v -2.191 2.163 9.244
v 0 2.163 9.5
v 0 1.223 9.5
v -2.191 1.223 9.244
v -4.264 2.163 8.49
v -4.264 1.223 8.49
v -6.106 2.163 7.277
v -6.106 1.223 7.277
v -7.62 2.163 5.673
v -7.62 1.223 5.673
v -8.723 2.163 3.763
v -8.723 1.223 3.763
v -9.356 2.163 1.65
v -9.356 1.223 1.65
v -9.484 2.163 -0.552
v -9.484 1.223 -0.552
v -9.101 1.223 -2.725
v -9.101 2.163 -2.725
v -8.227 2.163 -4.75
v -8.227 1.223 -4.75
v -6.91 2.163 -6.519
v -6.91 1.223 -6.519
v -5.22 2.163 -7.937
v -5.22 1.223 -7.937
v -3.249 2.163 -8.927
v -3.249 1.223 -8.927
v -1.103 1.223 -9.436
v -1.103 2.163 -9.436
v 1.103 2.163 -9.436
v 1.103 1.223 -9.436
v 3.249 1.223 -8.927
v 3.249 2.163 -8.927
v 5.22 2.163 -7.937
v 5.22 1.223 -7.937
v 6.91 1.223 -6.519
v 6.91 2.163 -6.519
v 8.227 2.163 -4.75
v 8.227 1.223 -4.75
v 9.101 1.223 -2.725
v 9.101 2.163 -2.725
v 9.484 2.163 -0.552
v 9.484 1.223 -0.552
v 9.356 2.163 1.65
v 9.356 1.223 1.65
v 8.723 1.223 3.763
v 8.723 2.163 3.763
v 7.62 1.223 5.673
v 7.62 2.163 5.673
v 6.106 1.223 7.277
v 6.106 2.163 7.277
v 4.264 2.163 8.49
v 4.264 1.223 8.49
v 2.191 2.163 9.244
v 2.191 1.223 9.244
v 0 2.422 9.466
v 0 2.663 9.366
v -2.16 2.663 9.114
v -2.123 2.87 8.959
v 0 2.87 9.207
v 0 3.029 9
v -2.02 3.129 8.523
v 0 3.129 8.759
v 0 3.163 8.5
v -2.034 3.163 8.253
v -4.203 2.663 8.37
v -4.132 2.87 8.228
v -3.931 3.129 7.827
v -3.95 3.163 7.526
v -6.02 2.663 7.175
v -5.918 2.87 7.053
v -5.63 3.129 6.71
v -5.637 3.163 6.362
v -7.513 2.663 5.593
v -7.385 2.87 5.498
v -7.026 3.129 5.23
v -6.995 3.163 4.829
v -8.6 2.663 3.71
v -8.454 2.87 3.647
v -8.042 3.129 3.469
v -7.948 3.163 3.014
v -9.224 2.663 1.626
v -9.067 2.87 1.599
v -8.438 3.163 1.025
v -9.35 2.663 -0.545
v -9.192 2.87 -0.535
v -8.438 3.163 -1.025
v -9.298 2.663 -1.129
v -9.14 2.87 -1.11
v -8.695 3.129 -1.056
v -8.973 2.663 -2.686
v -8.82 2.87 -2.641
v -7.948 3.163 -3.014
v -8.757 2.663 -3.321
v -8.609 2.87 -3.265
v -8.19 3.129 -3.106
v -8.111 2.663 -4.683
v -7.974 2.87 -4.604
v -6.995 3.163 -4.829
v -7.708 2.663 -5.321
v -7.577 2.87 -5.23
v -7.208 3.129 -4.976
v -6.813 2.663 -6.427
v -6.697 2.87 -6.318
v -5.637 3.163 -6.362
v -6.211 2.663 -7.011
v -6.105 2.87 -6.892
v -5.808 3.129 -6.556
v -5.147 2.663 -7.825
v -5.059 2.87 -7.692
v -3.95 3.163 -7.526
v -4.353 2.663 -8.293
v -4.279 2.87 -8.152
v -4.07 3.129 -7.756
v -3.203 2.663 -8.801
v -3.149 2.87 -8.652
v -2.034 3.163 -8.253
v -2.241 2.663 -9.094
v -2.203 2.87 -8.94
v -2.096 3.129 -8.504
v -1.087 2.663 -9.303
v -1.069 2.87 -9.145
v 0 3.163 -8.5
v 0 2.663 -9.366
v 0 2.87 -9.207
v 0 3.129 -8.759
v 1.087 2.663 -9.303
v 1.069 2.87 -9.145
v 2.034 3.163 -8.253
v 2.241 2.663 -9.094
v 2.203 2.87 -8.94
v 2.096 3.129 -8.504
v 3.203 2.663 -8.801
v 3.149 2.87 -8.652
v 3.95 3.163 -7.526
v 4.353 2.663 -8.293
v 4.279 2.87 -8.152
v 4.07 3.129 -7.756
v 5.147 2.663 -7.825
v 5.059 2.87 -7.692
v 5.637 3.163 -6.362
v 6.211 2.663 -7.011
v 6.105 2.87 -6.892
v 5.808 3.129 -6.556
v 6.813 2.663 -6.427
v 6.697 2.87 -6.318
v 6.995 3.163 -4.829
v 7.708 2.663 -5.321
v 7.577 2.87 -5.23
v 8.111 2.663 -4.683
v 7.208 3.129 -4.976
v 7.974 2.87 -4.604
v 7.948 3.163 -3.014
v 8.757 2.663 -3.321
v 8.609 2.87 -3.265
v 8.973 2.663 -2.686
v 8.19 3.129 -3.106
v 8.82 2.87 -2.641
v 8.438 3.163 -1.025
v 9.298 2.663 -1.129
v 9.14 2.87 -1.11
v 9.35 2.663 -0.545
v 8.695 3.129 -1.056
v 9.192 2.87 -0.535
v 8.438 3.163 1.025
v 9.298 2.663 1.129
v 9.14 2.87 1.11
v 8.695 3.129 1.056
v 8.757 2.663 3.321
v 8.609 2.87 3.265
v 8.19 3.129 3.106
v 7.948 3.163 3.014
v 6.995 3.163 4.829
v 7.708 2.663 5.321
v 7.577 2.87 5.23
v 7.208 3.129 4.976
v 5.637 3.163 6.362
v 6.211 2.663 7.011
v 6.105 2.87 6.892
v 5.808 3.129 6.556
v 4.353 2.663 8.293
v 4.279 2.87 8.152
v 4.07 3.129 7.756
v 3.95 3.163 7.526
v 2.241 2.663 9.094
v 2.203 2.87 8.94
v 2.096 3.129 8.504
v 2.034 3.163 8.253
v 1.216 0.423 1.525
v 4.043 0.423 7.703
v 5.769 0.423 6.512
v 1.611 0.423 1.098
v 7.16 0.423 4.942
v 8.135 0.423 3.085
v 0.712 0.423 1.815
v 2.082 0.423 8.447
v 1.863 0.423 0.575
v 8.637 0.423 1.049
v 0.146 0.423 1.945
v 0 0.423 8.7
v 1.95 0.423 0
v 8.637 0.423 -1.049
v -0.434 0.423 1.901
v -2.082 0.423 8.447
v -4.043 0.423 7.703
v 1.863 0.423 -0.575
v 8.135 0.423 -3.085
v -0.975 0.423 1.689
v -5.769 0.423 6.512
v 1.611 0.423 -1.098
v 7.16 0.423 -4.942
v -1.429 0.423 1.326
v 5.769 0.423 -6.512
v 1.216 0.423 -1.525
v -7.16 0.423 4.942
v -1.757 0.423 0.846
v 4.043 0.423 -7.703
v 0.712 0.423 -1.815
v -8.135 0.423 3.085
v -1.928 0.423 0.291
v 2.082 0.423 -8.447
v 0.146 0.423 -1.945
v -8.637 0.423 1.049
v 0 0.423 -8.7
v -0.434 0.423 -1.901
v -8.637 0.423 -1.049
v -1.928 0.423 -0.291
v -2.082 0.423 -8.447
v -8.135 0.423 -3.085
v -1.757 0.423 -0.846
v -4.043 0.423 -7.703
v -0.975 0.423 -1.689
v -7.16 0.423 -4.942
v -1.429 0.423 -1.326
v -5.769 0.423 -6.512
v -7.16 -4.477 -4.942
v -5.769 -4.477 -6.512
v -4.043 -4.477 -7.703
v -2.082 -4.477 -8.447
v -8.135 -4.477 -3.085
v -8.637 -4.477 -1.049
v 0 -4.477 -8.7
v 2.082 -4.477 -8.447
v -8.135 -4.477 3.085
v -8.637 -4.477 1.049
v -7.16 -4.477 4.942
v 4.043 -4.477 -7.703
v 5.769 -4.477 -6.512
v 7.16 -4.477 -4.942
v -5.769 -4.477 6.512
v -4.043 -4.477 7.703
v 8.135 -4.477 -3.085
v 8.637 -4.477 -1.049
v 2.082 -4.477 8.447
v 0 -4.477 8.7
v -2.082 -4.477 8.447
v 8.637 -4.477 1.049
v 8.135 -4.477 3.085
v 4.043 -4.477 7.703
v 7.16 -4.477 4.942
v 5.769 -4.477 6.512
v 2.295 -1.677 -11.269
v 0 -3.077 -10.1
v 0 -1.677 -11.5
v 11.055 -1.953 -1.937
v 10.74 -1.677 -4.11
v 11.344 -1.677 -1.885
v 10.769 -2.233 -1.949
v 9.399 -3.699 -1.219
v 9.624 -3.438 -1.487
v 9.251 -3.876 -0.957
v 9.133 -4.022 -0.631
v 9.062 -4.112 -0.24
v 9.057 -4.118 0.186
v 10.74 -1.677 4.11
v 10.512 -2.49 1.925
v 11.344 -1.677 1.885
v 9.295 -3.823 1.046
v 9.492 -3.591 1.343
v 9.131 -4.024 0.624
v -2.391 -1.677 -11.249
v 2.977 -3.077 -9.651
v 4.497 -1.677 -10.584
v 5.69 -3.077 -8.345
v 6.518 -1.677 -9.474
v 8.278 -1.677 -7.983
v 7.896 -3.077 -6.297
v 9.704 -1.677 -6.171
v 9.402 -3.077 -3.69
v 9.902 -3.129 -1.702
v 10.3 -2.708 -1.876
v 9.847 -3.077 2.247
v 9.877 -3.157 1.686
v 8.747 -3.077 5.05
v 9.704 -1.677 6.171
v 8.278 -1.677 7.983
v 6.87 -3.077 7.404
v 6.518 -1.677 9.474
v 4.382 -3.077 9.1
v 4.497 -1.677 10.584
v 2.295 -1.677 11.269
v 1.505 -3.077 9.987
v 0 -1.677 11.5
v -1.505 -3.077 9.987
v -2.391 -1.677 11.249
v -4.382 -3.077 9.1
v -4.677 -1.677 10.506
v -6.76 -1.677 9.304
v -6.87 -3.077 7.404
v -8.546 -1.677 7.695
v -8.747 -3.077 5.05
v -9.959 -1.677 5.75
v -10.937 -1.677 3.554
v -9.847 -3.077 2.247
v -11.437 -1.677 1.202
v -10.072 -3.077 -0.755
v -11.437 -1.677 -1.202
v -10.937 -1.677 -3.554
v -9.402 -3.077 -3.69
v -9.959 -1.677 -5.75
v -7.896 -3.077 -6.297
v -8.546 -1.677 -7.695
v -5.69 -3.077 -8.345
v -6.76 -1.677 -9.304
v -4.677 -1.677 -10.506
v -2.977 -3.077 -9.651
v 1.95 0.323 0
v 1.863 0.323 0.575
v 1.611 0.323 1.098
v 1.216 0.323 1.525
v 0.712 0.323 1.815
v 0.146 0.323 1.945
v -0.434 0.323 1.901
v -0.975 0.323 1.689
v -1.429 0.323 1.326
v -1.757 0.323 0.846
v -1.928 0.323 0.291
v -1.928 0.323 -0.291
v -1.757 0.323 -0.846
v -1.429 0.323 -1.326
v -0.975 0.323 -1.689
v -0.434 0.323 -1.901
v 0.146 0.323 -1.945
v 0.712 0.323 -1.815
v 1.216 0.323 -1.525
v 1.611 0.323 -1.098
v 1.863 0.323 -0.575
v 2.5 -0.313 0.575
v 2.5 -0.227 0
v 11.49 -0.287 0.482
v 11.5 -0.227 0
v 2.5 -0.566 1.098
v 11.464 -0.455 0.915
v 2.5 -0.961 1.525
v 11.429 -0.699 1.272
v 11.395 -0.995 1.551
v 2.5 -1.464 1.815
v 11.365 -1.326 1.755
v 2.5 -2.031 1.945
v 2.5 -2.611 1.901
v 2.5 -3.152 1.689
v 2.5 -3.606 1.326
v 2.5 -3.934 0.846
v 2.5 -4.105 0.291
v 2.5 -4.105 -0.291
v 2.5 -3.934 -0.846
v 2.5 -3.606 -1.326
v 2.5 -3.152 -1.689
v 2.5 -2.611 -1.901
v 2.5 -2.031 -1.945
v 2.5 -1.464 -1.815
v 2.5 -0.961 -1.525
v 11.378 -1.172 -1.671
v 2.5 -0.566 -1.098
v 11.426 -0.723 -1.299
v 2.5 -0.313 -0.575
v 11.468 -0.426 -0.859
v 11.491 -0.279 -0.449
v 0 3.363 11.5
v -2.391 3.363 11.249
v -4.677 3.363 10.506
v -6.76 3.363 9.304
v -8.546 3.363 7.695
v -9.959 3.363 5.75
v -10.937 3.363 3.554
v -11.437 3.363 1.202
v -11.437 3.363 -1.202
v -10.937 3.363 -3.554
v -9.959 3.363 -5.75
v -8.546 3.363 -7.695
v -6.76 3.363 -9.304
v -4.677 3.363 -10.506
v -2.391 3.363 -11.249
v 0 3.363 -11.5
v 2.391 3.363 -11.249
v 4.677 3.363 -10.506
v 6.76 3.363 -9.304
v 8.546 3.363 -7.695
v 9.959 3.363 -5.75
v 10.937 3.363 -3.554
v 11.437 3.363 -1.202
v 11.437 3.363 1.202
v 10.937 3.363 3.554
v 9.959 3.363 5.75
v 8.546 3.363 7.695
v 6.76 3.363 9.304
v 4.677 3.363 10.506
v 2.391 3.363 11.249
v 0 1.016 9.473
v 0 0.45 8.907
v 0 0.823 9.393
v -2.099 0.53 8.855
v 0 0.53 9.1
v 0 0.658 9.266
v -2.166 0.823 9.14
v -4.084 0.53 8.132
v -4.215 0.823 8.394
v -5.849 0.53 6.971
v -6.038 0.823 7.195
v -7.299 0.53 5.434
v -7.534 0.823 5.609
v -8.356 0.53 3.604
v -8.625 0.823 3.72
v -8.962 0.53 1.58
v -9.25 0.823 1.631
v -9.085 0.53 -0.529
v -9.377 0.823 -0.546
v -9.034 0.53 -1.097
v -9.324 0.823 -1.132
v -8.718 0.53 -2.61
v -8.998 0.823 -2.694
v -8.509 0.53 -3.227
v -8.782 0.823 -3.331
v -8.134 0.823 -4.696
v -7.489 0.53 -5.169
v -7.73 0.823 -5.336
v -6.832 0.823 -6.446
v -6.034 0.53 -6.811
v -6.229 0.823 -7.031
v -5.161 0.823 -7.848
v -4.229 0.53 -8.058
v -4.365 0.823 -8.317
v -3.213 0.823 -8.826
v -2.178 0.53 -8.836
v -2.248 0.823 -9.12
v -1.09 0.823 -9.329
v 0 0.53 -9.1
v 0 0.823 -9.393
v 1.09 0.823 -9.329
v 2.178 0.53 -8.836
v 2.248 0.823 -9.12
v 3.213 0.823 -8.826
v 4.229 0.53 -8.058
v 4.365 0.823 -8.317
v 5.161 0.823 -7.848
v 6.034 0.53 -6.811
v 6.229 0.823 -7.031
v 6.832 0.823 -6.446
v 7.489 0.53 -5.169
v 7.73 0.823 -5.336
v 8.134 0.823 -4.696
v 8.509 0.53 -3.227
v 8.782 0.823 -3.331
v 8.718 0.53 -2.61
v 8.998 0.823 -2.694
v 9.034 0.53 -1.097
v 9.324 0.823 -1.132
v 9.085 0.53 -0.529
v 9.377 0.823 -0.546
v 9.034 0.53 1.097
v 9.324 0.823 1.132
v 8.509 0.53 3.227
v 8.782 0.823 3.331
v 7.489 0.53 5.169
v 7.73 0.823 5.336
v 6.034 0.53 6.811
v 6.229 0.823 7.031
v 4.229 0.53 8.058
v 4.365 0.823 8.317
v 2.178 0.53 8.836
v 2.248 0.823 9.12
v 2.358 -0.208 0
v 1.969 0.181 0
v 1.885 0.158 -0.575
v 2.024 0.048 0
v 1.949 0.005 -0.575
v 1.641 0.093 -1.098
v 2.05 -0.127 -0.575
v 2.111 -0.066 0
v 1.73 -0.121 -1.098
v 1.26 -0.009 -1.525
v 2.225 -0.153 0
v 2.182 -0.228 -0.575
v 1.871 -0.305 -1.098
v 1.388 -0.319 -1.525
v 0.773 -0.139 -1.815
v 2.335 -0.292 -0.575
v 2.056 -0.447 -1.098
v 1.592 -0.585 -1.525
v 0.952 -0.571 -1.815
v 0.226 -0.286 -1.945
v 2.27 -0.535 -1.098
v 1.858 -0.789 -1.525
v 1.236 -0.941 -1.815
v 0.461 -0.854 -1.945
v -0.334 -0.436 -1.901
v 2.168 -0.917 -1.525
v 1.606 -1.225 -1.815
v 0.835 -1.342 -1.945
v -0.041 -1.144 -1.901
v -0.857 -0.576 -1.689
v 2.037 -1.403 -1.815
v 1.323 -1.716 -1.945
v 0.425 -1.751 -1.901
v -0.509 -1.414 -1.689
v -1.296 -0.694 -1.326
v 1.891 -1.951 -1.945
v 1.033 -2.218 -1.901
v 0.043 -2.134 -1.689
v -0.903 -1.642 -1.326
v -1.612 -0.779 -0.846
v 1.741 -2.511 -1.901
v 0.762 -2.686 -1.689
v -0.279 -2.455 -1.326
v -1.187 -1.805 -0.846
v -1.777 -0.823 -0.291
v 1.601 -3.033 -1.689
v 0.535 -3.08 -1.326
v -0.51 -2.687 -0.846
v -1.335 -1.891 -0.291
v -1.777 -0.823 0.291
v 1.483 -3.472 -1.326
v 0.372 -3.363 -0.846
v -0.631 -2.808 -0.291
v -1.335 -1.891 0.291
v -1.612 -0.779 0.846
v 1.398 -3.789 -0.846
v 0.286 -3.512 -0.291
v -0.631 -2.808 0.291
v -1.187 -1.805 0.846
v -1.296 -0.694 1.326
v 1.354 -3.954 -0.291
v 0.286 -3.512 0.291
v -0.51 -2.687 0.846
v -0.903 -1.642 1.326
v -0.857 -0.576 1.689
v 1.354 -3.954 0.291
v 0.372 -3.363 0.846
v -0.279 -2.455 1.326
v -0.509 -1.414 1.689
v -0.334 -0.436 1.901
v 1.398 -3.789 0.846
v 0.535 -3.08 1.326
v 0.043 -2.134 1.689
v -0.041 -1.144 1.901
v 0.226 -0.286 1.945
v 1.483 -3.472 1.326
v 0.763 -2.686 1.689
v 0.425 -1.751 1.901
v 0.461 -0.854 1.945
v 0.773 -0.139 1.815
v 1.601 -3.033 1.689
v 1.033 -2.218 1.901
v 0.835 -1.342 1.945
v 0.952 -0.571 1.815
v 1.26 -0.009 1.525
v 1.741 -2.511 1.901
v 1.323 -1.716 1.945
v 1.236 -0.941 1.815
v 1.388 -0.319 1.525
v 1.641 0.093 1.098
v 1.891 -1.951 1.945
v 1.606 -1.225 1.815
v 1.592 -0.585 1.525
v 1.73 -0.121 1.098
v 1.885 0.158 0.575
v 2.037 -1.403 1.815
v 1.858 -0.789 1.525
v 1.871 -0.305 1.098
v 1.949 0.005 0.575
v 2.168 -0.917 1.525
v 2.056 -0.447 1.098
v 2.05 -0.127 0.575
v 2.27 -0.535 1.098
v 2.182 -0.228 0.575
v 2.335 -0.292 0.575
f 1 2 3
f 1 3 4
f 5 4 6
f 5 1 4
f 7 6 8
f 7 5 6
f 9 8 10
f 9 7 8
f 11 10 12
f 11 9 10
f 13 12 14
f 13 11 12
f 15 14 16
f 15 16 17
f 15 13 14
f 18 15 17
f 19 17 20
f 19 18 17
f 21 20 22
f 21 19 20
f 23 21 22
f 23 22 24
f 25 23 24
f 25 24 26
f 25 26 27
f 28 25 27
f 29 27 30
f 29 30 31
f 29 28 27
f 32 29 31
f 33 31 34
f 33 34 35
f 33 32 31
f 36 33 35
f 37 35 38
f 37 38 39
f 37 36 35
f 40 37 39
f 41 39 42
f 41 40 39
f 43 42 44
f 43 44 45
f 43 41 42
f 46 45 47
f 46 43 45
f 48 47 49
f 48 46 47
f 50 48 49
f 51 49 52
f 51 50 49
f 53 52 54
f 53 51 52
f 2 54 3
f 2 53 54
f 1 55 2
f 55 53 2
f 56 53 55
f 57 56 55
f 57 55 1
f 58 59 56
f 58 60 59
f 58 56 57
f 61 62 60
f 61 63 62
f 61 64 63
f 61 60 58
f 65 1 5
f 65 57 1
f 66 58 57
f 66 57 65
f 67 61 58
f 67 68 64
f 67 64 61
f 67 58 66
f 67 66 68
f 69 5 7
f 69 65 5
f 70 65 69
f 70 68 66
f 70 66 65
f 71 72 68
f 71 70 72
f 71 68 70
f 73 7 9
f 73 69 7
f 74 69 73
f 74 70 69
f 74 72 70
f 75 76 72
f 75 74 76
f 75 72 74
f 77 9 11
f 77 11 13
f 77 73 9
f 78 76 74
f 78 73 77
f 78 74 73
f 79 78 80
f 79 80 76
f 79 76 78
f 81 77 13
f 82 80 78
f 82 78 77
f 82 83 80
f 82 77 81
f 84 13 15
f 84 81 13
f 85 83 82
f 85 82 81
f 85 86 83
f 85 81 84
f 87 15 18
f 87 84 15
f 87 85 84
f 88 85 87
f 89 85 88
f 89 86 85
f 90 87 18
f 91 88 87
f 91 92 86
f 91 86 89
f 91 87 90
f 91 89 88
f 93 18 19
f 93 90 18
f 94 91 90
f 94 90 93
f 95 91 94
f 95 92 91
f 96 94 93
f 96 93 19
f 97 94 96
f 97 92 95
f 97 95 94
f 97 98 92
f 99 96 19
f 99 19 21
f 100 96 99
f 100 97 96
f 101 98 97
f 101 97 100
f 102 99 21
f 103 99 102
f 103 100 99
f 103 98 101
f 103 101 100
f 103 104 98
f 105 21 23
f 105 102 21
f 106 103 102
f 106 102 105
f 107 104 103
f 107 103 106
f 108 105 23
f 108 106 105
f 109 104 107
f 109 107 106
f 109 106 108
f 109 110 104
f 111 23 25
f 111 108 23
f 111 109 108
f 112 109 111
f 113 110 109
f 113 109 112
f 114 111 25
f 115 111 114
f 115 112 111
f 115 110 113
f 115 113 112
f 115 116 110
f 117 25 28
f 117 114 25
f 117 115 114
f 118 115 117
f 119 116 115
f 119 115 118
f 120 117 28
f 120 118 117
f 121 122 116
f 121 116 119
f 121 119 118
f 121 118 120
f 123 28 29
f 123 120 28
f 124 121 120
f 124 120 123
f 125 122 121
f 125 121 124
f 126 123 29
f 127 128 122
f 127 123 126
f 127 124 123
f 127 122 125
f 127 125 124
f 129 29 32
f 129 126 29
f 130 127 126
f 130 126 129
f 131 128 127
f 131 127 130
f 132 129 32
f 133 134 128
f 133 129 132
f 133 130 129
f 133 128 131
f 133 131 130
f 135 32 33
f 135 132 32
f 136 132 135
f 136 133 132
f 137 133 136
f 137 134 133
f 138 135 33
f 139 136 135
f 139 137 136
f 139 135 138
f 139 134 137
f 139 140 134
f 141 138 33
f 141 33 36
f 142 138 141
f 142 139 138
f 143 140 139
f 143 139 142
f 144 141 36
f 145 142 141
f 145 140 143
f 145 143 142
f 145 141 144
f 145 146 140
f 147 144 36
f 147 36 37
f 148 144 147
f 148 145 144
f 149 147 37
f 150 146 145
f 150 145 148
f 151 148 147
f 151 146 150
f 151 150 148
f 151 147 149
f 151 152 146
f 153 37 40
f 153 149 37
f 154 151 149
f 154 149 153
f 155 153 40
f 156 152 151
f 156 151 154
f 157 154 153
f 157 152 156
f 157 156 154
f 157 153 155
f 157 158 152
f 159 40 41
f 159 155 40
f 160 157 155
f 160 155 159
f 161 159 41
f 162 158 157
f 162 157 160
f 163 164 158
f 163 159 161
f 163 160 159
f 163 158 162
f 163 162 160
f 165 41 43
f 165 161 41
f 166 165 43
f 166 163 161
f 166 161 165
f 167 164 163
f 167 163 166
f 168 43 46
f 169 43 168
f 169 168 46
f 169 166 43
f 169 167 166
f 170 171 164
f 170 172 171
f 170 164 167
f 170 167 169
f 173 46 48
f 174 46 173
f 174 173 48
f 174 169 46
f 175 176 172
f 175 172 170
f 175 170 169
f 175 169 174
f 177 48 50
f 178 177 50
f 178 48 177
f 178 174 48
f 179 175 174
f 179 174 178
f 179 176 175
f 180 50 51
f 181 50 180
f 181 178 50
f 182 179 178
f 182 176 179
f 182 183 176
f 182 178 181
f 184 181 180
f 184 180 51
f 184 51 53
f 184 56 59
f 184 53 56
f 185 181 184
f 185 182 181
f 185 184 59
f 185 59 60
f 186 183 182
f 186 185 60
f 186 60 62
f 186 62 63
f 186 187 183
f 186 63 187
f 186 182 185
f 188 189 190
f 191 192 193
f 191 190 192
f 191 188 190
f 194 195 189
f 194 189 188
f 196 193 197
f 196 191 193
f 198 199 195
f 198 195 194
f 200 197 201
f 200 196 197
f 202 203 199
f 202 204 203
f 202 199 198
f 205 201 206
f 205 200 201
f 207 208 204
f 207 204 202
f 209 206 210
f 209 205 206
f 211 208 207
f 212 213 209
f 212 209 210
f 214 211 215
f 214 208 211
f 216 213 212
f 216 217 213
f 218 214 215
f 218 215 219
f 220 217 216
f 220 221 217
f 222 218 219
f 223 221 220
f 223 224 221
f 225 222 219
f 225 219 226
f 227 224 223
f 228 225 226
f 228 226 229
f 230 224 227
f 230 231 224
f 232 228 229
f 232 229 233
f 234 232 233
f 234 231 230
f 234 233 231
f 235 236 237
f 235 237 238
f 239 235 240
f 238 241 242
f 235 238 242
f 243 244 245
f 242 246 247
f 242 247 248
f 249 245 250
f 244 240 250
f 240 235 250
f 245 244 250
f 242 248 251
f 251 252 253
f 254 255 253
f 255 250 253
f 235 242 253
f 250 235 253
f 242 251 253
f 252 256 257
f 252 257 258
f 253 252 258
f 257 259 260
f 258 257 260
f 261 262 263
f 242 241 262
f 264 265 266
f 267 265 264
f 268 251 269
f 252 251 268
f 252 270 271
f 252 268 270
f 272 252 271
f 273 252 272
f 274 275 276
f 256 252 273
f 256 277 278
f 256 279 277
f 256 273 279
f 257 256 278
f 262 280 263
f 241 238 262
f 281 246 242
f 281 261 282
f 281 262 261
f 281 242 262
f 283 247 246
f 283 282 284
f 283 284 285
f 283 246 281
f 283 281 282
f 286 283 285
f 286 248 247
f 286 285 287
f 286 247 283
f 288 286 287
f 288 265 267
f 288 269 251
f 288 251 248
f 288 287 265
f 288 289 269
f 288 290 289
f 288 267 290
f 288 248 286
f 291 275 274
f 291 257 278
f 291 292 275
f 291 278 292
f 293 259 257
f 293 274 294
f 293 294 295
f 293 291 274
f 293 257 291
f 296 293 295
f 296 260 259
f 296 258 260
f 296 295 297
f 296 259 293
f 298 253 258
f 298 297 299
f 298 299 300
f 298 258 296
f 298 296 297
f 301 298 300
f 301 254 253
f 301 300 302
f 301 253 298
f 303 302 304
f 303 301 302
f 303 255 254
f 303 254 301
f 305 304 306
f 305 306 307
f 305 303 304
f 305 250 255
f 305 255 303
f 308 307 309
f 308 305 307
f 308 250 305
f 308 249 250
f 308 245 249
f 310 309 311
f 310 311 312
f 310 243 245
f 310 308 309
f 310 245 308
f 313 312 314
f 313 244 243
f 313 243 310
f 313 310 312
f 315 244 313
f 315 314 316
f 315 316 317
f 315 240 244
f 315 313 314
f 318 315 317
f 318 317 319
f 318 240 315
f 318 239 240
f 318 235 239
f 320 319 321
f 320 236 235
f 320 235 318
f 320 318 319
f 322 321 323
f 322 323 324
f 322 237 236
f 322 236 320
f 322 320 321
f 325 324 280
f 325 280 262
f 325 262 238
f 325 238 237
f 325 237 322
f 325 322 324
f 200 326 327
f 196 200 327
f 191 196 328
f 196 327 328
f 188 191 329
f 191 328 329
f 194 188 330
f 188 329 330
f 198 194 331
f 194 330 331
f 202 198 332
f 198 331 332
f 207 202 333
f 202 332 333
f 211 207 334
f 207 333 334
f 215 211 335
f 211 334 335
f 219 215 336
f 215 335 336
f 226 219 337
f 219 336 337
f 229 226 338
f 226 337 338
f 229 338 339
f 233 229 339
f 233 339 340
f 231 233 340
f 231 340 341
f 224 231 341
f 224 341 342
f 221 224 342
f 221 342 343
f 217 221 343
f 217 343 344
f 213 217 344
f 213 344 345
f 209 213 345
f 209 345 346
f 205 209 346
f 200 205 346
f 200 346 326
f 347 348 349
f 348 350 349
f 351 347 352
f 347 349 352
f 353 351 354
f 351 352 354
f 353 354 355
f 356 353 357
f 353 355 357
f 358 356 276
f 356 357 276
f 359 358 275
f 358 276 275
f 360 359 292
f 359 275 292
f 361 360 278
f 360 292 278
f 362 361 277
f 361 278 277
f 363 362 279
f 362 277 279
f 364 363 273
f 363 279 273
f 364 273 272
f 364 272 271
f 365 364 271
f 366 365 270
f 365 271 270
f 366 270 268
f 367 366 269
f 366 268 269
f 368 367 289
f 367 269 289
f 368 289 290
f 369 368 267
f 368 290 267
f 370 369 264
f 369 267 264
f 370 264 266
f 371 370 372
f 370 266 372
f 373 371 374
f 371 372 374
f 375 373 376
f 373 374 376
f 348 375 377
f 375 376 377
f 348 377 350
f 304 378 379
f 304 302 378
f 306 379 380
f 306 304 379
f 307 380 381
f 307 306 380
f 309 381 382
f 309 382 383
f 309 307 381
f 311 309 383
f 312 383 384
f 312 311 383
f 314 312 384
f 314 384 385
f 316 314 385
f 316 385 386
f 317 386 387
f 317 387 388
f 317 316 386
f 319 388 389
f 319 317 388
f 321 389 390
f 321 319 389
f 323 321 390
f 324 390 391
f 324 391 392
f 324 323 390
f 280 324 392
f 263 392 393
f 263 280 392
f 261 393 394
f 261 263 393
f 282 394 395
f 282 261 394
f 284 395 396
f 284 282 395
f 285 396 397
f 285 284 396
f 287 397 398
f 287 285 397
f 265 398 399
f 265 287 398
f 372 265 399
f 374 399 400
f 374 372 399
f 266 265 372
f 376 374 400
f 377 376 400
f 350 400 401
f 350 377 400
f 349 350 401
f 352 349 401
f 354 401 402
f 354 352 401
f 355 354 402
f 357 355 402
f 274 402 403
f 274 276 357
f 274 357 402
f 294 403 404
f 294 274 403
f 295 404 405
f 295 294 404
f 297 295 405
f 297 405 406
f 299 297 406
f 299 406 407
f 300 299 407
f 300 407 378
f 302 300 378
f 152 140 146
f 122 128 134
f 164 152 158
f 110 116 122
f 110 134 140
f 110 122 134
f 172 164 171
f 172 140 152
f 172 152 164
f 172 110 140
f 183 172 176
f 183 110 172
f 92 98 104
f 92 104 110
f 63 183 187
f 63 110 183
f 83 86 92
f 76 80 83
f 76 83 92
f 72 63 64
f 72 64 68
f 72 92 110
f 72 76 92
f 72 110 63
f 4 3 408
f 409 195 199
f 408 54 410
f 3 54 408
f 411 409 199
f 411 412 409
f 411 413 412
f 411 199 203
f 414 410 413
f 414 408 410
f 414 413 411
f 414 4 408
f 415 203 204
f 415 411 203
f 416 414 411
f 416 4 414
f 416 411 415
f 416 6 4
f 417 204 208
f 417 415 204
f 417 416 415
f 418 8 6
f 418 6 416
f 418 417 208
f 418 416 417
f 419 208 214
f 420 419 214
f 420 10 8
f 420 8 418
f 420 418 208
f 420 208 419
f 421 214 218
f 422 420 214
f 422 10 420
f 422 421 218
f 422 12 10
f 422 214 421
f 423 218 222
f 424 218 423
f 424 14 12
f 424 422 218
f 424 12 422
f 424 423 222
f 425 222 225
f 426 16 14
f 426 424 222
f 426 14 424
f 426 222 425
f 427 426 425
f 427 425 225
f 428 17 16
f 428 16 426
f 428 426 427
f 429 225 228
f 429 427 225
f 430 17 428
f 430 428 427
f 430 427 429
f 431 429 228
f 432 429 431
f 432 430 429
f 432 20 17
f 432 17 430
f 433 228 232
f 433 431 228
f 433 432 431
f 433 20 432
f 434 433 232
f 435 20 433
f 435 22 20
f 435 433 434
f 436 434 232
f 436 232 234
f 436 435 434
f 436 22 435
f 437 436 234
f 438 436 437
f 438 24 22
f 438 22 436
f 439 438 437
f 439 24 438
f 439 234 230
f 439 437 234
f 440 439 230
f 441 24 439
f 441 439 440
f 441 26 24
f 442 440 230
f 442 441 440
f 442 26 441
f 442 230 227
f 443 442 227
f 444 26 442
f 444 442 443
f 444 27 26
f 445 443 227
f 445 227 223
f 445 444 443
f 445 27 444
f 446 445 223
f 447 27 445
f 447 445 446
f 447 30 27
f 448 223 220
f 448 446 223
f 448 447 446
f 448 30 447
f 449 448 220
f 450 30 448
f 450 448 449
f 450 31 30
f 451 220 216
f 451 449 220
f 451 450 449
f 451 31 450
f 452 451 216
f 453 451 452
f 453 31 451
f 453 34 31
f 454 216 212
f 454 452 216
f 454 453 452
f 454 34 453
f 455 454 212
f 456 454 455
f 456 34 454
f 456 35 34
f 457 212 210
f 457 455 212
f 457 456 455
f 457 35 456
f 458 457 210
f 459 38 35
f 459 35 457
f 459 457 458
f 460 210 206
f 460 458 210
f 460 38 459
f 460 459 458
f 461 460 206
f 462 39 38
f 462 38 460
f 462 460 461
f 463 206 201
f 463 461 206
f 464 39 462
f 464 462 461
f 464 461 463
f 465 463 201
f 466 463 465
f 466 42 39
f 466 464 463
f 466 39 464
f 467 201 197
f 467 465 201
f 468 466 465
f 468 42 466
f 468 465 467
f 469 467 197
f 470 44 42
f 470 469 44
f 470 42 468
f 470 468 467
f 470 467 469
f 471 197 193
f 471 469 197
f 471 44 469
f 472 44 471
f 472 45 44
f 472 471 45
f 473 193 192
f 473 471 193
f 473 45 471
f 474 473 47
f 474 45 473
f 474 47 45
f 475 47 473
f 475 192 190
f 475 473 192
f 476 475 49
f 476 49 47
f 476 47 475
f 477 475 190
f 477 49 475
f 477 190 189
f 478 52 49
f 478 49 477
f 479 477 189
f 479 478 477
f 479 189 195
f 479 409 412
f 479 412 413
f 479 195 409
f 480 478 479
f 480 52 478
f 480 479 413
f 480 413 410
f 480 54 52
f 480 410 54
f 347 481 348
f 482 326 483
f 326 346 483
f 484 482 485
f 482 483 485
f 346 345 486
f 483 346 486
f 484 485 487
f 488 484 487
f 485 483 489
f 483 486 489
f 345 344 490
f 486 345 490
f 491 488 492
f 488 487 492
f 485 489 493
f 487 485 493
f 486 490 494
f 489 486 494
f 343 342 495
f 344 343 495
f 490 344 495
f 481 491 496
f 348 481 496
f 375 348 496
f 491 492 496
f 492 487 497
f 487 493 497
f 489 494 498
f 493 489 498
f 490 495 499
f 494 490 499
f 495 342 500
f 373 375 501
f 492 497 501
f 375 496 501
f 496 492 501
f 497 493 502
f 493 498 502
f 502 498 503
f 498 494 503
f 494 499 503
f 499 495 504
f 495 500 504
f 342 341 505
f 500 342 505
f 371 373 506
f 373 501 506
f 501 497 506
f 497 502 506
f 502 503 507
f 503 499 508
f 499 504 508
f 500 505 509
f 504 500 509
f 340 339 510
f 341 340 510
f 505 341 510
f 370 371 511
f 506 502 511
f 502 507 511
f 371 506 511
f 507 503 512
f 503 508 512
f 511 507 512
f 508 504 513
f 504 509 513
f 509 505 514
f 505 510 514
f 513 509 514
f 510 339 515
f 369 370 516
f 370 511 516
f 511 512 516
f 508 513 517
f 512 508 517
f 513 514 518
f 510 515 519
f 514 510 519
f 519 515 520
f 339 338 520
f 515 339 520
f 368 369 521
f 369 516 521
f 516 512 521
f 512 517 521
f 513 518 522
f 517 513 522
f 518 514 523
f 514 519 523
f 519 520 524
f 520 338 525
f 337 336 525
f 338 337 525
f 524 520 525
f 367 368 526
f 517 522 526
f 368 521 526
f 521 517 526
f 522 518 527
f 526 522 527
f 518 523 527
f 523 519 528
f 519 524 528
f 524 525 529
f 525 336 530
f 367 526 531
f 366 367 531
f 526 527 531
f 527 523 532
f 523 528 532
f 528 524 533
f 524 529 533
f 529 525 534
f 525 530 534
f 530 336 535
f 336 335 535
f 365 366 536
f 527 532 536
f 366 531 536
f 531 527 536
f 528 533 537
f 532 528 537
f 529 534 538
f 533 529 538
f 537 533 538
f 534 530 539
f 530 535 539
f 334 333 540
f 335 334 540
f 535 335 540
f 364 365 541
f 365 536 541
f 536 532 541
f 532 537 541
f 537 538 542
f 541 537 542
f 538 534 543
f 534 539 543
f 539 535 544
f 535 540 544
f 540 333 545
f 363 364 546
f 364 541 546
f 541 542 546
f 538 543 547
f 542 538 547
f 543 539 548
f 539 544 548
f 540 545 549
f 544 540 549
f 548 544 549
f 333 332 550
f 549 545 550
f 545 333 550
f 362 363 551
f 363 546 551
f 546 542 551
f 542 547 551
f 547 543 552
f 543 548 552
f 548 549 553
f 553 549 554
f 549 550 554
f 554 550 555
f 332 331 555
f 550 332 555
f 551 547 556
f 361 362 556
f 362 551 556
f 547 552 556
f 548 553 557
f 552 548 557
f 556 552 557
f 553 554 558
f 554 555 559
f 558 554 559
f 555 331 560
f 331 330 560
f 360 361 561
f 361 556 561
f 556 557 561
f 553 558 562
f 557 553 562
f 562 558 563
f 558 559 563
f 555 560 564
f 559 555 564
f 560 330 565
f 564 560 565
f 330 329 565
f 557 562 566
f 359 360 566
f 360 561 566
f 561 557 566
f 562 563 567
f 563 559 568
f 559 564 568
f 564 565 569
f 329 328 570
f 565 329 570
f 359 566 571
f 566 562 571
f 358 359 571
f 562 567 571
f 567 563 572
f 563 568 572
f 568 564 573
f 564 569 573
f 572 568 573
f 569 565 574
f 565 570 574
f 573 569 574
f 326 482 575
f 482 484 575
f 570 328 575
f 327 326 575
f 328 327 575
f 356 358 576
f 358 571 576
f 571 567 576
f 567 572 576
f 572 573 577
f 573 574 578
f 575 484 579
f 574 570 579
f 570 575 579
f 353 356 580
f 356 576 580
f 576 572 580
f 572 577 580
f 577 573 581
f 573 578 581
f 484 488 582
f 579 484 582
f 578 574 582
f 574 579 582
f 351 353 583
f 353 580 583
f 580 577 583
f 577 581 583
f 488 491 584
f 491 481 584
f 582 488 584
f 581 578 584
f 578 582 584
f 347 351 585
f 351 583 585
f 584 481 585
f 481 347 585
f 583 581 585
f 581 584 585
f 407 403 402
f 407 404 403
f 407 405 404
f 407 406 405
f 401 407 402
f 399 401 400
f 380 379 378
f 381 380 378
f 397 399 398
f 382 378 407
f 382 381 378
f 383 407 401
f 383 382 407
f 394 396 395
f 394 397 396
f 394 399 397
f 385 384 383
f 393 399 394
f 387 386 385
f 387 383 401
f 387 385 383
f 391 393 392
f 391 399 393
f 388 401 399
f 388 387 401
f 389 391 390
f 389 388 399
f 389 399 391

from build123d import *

# Parameters (mm, degrees)
FILLET3_R           = 0.8
FILLET4_R           = 1
SKETCH6_R           = 2.45
BOSS_EXTRUDE2_DEPTH = 2.8
CHAMFER2_SIZE       = 9.05
SKETCH9_R           = 1.95


with BuildPart() as part:
    # Sketch1 → Revolve1 (revolve)
    with BuildSketch(Plane.XY, mode=Mode.PRIVATE) as revolve1_sk:
        Polygon((0, 3.363206456), (-11.5, 3.363206456), (-11.5, -1.676793544), (0, -1.676793544), (0, 0.423206456), (-9.5, 0.423206456), (-9.5, 3.163206456), (0, 3.163206456), align=None)
    revolve(revolve1_sk.sketch.rotate(Axis((0, 2.051889918, 0), (0, -1, 0)), 270), axis=Axis((0, 2.051889918, 0), (0, -1, 0)))

    # Fillet3
    fillet3_edges = [part.edges().sort_by_distance(p)[0] for p in [
        (0, 0.423206456, -9.5),
    ]]
    fillet(fillet3_edges, radius=FILLET3_R)

    # Fillet4
    fillet4_edges = [part.edges().sort_by_distance(p)[0] for p in [
        (0, 3.163206456, -9.5),
    ]]
    fillet(fillet4_edges, radius=FILLET4_R)

    # Sketch6 → Boss-Extrude2 (add)
    with BuildSketch(Plane.XZ.offset(1.676793544)):
        with Locations(Location((0, 0, 0), (0, 0, 270))):
            Circle(SKETCH6_R)
    extrude(amount=BOSS_EXTRUDE2_DEPTH)

    # Chamfer2
    # the kernel refuses this chamfer: 9.05 mm, written as the material it adds along each edge
    with BuildSketch(Plane(origin=(0, -1.676793544, 0), x_dir=(0, 0, -1), z_dir=(-1, 0, 0))) as chamfer2_piece_1_section:
        Polygon((2.45 + CHAMFER2_SIZE, 0), (2.45, CHAMFER2_SIZE), (2.45, 0), align=None)
    chamfer2_piece_1 = revolve(axis=Axis((0, -1.676793544, 0), (0, -1, 0)), mode=Mode.PRIVATE)
    chamfer2_piece_1 = chamfer2_piece_1 & Plane(origin=(0, -3.007193491, 0), x_dir=(0, 0, 1), z_dir=(0, -1, 0)) * Cylinder(11.5, 46, mode=Mode.PRIVATE)
    chamfer2_piece_1 = split(chamfer2_piece_1, bisect_by=Plane(origin=(0, -4.476793544, 10.030399947), z_dir=(0, 1, 0)), keep=Keep.TOP, mode=Mode.PRIVATE)
    add(chamfer2_piece_1)

    # Cut-Sweep1: sweep along a path in Sketch10
    with BuildLine(Plane.XY) as cut_sweep1_path:
        Line((0, 0.423206456), (0, 0.323206456))
        ThreePointArc((0, 0.323206456), (0.732233047, -1.444560497), (2.5, -2.176793544))
        Line((2.5, -2.176793544), (11.5, -2.176793544))
    # Sketch9 → Cut-Sweep1 (sweep, cut)
    with BuildSketch(Plane(origin=(0, 0.423206456, 0), x_dir=(1, 0, 0), z_dir=(0, 1, 0))):
        Circle(SKETCH9_R)
    sweep(path=cut_sweep1_path.line, mode=Mode.SUBTRACT)


solid = part.part
